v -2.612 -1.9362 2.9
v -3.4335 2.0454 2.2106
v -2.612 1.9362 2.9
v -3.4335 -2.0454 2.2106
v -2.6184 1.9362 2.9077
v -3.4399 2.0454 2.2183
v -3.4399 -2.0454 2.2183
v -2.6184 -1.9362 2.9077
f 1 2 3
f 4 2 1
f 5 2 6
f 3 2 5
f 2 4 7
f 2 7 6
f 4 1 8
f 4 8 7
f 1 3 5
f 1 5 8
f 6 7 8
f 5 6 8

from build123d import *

# Parameters (mm, degrees)
PAD_DEPTH       = 2.15
POCKET_DEPTH    = 10
POCKET001_DEPTH = 12.5
CHAMFER_SIZE    = 0.7
PAD001_DEPTH    = 0.01


with BuildPart() as chamfer_body:
    # Sketch → Pad (new body, symmetric)
    with BuildSketch(Plane.XZ):
        Polygon((-3.311958576, 2.9), (3.311958576, 2.9), (3.55, 1.55), (3.311958576, 0.2), (2.1, 0.2), (2.1, 0), (-2.1, 0), (-2.1, 0.2), (-3.311958576, 0.2), (-3.55, 1.55), align=None)
    extrude(amount=PAD_DEPTH, both=True)

    # Sketch001 → Pocket (cut, symmetric)
    with BuildSketch(Plane(origin=(2.1, 0, 0), x_dir=(0, 0, 1), z_dir=(1, 0, 0))):
        Polygon((2.9220926693, 2.229851), (3.3067026402, 1.8717656945), (1.045841, 2.229851), align=None)
        Polygon((3.3067026402, -1.8717656945), (2.9220926693, -2.229851), (1.045841, -2.229851), align=None)
    extrude(amount=POCKET_DEPTH, both=True, mode=Mode.SUBTRACT)

    # Sketch002 → Pocket001 (cut, symmetric)
    with BuildSketch(Plane(origin=(2.1, 0, 0), x_dir=(0, 0, 1), z_dir=(1, 0, 0))):
        Polygon((2.1937543082, 2.2519614985), (-0.4776096389, 2.2519614985), (-0.6097972306, 1.8079225571), align=None)
        Polygon((2.1937543082, -2.2519614985), (-0.4776096389, -2.2519614985), (-0.6097972306, -1.8079225571), align=None)
    extrude(amount=POCKET001_DEPTH, both=True, mode=Mode.SUBTRACT)

    # Chamfer
    chamfer_edges = [chamfer_body.edges().sort_by_distance(p)[0] for p in [
        (-3.311959, 0, 2.9),
    ]]
    chamfer(chamfer_edges, length=CHAMFER_SIZE)


with BuildPart() as cut:
    # Pad001 base: copy of Chamfer body
    add(chamfer_body.part)

    # Sketch010 → Pad001 (new body)
    with BuildSketch(Plane(origin=(-2.5071696065, 0, 2.9879283857), x_dir=(-0.7660444431, 0, -0.6427876097), z_dir=(-0.6427876097, 0, 0.7660444431))):
        Polygon((0.1367922847, 1.9361810645), (1.2092545051, 2.0453658219), (1.2092545051, -2.0453658219), (0.1367922847, -1.9361810645), align=None)
    extrude(amount=PAD001_DEPTH)

    # Cut: cut Chamfer body
    add(chamfer_body.part, mode=Mode.SUBTRACT)


solid = cut.part
